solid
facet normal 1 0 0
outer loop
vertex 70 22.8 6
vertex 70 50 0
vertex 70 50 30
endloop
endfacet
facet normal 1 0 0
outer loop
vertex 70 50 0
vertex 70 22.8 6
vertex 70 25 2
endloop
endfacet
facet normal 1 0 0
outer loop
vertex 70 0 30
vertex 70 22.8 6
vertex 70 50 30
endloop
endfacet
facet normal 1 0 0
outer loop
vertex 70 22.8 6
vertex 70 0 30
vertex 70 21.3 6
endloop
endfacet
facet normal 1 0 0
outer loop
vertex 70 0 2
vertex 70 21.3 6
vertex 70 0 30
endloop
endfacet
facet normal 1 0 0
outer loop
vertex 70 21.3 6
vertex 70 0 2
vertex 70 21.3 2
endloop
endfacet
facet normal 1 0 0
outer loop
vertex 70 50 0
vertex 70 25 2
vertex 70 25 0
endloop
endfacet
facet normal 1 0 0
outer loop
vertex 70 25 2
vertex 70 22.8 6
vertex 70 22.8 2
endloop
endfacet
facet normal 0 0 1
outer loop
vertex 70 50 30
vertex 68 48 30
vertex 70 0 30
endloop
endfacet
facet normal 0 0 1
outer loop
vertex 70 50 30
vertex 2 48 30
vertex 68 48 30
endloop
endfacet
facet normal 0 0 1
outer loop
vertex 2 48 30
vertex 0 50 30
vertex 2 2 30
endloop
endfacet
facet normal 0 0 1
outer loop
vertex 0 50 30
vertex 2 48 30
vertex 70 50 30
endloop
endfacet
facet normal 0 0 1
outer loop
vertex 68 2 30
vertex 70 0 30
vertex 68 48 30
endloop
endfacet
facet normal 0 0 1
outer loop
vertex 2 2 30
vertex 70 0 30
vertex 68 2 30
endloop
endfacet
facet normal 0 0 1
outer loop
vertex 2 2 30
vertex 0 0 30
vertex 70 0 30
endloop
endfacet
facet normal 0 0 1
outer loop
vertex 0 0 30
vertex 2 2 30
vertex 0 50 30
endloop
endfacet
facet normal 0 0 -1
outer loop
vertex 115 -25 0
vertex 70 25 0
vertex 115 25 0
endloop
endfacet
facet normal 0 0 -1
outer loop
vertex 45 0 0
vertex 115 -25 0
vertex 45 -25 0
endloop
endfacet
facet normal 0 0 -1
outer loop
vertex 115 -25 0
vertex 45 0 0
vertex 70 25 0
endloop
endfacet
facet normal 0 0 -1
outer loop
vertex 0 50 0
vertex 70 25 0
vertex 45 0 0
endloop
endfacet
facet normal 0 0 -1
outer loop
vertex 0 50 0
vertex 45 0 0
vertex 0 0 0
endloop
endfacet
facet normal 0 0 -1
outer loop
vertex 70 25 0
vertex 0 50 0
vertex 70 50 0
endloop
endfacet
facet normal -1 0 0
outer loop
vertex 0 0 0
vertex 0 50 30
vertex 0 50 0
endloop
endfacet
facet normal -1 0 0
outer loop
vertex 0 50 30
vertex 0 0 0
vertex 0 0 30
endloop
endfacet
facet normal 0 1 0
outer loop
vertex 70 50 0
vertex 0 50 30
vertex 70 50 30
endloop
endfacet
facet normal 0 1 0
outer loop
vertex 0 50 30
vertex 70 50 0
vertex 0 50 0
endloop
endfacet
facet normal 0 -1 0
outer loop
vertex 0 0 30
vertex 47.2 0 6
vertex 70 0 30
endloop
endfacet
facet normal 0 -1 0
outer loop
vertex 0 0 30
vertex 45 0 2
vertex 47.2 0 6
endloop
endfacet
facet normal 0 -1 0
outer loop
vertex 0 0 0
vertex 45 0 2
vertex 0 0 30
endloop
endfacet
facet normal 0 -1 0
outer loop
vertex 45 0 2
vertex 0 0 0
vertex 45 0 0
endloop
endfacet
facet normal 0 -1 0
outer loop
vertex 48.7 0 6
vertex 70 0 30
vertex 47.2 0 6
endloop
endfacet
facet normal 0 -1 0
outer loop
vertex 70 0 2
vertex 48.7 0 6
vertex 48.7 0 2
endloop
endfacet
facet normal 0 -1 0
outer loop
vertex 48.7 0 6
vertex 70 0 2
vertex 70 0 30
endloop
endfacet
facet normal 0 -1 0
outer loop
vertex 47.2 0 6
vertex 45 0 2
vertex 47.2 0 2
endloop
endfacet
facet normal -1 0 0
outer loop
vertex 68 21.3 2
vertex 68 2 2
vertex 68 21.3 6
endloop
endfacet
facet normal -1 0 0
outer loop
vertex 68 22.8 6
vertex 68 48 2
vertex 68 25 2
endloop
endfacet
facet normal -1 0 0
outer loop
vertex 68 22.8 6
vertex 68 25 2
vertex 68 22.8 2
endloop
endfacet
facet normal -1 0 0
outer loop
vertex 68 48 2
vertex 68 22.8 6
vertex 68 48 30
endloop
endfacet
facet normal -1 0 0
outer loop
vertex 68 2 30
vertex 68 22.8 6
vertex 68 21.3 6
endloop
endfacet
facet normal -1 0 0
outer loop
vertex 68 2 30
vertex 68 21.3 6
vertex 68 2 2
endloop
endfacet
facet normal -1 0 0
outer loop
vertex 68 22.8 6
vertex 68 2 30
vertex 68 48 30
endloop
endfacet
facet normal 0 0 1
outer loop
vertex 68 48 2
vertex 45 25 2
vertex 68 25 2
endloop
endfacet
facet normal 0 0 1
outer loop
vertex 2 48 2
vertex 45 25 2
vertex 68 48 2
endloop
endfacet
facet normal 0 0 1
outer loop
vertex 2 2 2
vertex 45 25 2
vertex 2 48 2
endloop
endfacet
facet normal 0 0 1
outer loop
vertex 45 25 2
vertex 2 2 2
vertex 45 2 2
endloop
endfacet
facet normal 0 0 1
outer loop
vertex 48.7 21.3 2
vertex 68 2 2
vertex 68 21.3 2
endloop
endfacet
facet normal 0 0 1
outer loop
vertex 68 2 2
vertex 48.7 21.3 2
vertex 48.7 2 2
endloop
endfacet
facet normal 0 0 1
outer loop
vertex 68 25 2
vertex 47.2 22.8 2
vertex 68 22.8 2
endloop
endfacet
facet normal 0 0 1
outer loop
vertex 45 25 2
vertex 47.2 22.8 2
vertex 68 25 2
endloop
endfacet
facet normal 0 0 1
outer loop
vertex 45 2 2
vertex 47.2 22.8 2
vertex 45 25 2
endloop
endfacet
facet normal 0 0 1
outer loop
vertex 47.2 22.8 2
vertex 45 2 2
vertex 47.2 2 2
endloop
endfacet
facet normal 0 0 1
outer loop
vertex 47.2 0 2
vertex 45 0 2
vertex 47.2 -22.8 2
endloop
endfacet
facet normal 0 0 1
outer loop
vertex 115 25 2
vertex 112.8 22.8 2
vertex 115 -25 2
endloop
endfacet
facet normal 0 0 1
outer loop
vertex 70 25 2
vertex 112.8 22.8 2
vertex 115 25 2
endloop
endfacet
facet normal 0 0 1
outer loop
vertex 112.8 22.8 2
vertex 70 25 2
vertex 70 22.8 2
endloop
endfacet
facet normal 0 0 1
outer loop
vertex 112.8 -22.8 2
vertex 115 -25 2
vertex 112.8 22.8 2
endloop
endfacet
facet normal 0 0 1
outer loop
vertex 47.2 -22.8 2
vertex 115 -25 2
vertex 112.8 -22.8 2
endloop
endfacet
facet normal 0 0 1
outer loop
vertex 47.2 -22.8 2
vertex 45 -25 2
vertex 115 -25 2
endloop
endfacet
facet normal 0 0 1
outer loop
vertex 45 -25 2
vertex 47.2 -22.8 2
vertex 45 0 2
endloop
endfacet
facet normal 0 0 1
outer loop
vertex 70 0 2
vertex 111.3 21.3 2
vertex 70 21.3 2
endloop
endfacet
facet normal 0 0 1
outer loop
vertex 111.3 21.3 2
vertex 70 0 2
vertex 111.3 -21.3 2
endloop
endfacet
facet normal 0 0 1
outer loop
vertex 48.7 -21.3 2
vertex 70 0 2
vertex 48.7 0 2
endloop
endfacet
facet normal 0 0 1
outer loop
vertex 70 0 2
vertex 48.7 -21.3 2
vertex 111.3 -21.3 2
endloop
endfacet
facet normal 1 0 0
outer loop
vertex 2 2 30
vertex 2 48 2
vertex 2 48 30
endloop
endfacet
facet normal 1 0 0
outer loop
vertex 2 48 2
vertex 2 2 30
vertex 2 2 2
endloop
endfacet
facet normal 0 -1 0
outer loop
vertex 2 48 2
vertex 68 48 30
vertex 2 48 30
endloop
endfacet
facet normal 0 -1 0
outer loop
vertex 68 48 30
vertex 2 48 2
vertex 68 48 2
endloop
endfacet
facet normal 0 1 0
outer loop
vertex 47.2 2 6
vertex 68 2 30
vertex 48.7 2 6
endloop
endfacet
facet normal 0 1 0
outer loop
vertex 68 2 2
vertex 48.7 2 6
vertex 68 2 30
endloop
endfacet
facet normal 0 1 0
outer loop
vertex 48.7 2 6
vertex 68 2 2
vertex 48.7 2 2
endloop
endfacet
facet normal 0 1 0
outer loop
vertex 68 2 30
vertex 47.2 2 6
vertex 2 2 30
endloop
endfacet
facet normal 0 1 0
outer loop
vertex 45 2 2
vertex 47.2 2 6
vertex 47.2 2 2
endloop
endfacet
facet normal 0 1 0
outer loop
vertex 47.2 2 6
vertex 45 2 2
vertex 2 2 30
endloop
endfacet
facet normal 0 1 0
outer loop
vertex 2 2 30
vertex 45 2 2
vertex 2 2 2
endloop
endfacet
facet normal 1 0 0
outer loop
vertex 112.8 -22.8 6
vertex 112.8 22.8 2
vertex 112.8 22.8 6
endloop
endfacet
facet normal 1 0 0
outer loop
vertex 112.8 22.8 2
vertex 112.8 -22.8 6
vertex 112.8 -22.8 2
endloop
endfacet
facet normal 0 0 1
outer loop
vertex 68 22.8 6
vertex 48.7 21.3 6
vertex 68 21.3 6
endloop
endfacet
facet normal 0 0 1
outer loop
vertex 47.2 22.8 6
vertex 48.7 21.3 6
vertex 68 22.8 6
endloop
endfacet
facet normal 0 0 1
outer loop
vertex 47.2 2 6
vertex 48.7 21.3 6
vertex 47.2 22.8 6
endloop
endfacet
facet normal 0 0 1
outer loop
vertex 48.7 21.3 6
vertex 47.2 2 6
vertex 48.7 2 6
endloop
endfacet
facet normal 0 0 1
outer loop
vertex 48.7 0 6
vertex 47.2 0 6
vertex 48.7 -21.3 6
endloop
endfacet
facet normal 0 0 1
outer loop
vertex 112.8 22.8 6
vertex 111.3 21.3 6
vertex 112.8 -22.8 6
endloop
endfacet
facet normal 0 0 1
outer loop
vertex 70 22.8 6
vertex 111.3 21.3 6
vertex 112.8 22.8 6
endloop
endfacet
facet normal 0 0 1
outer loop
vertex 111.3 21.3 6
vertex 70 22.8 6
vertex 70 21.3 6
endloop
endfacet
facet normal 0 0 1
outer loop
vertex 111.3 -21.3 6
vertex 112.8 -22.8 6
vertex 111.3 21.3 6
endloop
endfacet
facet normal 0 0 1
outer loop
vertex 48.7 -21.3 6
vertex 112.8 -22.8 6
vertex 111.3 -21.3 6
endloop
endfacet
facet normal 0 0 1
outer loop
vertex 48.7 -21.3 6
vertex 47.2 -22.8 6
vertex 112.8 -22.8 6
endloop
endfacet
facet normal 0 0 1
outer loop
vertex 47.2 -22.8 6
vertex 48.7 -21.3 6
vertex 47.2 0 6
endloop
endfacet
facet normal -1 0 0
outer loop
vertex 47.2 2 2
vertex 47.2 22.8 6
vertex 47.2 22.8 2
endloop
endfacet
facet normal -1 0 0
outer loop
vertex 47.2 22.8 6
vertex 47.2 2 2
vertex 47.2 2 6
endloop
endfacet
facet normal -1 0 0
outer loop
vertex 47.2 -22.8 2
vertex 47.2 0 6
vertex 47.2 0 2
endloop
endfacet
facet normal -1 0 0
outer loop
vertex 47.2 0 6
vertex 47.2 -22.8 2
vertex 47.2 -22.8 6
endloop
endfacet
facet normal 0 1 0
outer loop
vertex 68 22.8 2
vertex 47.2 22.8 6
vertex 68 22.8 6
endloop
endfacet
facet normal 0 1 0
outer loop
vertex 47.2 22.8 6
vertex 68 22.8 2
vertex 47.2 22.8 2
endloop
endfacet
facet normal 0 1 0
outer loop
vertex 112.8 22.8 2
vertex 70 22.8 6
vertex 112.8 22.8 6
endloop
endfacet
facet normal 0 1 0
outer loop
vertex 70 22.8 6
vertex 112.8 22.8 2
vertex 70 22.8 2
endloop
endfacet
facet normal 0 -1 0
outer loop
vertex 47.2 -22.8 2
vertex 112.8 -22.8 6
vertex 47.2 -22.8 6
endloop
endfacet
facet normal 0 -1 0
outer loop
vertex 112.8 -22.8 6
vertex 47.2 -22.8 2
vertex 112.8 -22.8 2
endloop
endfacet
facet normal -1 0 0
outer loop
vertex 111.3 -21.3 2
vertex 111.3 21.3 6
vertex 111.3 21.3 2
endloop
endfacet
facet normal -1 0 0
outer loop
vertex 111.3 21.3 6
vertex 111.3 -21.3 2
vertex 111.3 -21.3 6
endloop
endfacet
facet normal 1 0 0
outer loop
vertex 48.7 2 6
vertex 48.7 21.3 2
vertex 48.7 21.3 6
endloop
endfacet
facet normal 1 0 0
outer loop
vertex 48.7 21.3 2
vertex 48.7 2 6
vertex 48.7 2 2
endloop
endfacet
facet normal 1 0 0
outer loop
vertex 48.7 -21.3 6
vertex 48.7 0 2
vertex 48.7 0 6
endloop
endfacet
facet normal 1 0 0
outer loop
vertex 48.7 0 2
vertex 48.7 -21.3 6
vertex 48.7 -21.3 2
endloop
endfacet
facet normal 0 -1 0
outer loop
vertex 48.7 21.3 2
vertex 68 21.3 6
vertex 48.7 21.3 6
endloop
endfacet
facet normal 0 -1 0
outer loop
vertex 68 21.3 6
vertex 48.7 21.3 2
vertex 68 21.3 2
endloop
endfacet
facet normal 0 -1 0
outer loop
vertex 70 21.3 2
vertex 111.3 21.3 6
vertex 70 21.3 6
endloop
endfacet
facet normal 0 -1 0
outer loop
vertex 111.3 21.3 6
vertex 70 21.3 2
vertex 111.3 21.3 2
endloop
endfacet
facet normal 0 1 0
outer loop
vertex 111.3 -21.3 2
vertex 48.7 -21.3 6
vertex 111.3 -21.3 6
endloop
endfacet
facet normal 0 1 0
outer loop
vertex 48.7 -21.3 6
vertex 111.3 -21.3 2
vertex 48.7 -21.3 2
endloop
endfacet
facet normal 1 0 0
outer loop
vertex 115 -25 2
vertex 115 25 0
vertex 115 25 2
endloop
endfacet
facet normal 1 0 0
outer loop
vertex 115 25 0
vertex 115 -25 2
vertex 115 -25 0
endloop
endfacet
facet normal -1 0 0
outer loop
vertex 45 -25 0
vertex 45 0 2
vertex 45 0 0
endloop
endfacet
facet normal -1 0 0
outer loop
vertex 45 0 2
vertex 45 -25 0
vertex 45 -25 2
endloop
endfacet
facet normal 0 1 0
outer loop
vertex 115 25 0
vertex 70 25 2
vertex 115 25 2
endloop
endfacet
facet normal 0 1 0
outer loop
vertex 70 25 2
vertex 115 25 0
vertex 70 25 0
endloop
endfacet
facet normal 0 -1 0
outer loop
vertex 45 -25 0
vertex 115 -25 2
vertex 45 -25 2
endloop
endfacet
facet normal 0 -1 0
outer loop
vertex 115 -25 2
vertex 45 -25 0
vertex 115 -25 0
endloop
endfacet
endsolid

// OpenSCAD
// --- Dimensions ---
// Box outer dimensions
BOX_W = 70;
BOX_D = 50;
BOX_H = 30;

// Box wall and floor thickness
BOX_WALL = 2;
BOX_FLOOR = 2;

// Lid plate dimensions
LID_W = 70;
LID_D = 50;
LID_THICK = 2;

// Lid lip dimensions
LIP_THICK = 1.5;
LIP_H = 4;
LIP_W = 65.6;
LIP_D = 45.6;

// Clearance for lip insertion
CLEARANCE = 0.2;

// Gap between parts on the print bed
PART_GAP = 10;

// --- Calculated Values ---
// Box inner dimensions
BOX_INNER_W = BOX_W - 2 * BOX_WALL;
BOX_INNER_D = BOX_D - 2 * BOX_WALL;
BOX_INNER_H = BOX_H - BOX_FLOOR;

// Lid lip inner dimensions (to fit inside the box)
// The lip slides into the box. The box opening is BOX_INNER_W x BOX_INNER_D.
// The lip outer size is LIP_W x LIP_D.
// Clearance is on each side, so we subtract 2*clearance from the box inner size to get the lip outer size?
// No, the user specified the lip outer size as 65.6 x 45.6.
// Let's check: BOX_INNER_W = 70 - 4 = 66.
// 66 - 65.6 = 0.4. 0.4 / 2 = 0.2. This matches the 0.2 mm clearance.
// So the lip fits inside the box with 0.2 mm gap on each side.

// --- Positioning ---
// Box is centered at X=0, Y=0.
// Lid is placed on the +X side with a 10 mm gap.
// Box extends from X = -35 to 35.
// Lid starts at X = 35 + 10 = 45.
// Lid width is 70, so it extends from 45 to 115.
// Center of lid in X: 45 + 35 = 80.
// Both are centered in Y.

// --- Part 1: The Box ---
// Built in print orientation: rests on XY plane, builds upward +Z.
// Open top.

module Box() {
    // Base plate (floor)
    // We build the box as a solid block and subtract the inner volume.
    // This ensures the floor and walls are solid.
    
    // Outer shell
    difference() {
        // Solid block
        cube([BOX_W, BOX_D, BOX_H], center = false);
        
        // Inner cavity (subtractive)
        // The cavity starts at z = BOX_FLOOR (thickness of floor)
        // It goes up to BOX_H (open top)
        // It is inset by BOX_WALL from the sides.
        translate([BOX_WALL, BOX_WALL, BOX_FLOOR]) {
            // Extend slightly past the top to ensure clean cut if needed, 
            // though open top means we just cut down to the floor level.
            // To avoid coplanar faces, we extend the cut slightly into the floor or up.
            // Let's extend the cut slightly below the floor level to ensure the bottom face is clean.
            // Actually, standard practice: cut volume is slightly larger than the void.
            // Void: X: [BOX_WALL, BOX_W-BOX_WALL], Y: [BOX_WALL, BOX_D-BOX_WALL], Z: [BOX_FLOOR, BOX_H]
            // Let's make the cut slightly deeper into the floor to avoid Z-fighting or coplanar issues.
            // Cut Z range: [BOX_FLOOR - 0.01, BOX_H + 0.01]
            cube([BOX_INNER_W, BOX_INNER_D, BOX_INNER_H + 0.01], center = false);
        }
    }
}

// --- Part 2: The Lid ---
// Printed upside down.
// The user says: "a plate 70 x 50 x 2 mm lying on the bed, with a rectangular lip on top of it".
// "Printed upside down" usually means the final part is inverted relative to the print orientation.
// However, the description "plate ... lying on the bed, with a lip on top of it" describes the geometry in the print orientation.
// If the lid is printed "upside down", it typically means the "top" of the lid (the side that faces up when closed) is the bottom of the print.
// But the description explicitly says: "a plate ... lying on the bed ... with a lip on top of it".
// This implies the geometry is: Plate on bed, Lip sticking up.
// When you flip this over to use it, the Plate becomes the top surface, and the Lip hangs down into the box.
// This matches the requirement: "slides into the box opening".
// So we model it exactly as described: Plate on Z=0, Lip extending +Z.

module Lid() {
    union() {
        // Plate
        // Centered in X, Y.
        // X: -35 to 35, Y: -25 to 25.
        translate([-LID_W/2, -LID_D/2, 0]) {
            cube([LID_W, LID_D, LID_THICK], center = false);
        }
        
        // Lip
        // Outer size 65.6 x 45.6, centered on the plate.
        // Height 4 mm.
        // Thickness 1.5 mm.
        // The lip is a hollow box? "1.5 mm thick wall".
        // Yes, it's a wall.
        
        // Lip outer dimensions
        lip_outer_w = LIP_W;
        lip_outer_d = LIP_D;
        lip_inner_w = lip_outer_w - 2 * LIP_THICK;
        lip_inner_d = lip_outer_d - 2 * LIP_THICK;
        
        // Lip position: Centered on the plate.
        // Plate is from -35 to 35 in X.
        // Lip is from -32.8 to 32.8 in X (65.6 width).
        // Lip is from -22.8 to 22.8 in Y (45.6 depth).
        
        // We build the lip as a solid block and subtract the inner void.
        // The lip sits on top of the plate.
        // Plate top is at Z = LID_THICK = 2.
        // Lip bottom is at Z = 2.
        // Lip top is at Z = 2 + LIP_H = 6.
        
        translate([-lip_outer_w/2, -lip_outer_d/2, LID_THICK]) {
            difference() {
                // Outer lip block
                cube([lip_outer_w, lip_outer_d, LIP_H], center = false);
                
                // Inner void
                // Extend slightly to ensure clean cut
                translate([LIP_THICK, LIP_THICK, -0.01]) {
                    cube([lip_inner_w, lip_inner_d, LIP_H + 0.01], center = false);
                }
            }
        }
    }
}

// --- Main Assembly ---
// Place parts side by side.
// Box at X=0.
// Lid at X=80 (center).

$fn = 64;

// Box
translate([0, 0, 0]) {
    Box();
}

// Lid
// Center of lid is at X=80, Y=0.
translate([80, 0, 0]) {
    Lid();
}
